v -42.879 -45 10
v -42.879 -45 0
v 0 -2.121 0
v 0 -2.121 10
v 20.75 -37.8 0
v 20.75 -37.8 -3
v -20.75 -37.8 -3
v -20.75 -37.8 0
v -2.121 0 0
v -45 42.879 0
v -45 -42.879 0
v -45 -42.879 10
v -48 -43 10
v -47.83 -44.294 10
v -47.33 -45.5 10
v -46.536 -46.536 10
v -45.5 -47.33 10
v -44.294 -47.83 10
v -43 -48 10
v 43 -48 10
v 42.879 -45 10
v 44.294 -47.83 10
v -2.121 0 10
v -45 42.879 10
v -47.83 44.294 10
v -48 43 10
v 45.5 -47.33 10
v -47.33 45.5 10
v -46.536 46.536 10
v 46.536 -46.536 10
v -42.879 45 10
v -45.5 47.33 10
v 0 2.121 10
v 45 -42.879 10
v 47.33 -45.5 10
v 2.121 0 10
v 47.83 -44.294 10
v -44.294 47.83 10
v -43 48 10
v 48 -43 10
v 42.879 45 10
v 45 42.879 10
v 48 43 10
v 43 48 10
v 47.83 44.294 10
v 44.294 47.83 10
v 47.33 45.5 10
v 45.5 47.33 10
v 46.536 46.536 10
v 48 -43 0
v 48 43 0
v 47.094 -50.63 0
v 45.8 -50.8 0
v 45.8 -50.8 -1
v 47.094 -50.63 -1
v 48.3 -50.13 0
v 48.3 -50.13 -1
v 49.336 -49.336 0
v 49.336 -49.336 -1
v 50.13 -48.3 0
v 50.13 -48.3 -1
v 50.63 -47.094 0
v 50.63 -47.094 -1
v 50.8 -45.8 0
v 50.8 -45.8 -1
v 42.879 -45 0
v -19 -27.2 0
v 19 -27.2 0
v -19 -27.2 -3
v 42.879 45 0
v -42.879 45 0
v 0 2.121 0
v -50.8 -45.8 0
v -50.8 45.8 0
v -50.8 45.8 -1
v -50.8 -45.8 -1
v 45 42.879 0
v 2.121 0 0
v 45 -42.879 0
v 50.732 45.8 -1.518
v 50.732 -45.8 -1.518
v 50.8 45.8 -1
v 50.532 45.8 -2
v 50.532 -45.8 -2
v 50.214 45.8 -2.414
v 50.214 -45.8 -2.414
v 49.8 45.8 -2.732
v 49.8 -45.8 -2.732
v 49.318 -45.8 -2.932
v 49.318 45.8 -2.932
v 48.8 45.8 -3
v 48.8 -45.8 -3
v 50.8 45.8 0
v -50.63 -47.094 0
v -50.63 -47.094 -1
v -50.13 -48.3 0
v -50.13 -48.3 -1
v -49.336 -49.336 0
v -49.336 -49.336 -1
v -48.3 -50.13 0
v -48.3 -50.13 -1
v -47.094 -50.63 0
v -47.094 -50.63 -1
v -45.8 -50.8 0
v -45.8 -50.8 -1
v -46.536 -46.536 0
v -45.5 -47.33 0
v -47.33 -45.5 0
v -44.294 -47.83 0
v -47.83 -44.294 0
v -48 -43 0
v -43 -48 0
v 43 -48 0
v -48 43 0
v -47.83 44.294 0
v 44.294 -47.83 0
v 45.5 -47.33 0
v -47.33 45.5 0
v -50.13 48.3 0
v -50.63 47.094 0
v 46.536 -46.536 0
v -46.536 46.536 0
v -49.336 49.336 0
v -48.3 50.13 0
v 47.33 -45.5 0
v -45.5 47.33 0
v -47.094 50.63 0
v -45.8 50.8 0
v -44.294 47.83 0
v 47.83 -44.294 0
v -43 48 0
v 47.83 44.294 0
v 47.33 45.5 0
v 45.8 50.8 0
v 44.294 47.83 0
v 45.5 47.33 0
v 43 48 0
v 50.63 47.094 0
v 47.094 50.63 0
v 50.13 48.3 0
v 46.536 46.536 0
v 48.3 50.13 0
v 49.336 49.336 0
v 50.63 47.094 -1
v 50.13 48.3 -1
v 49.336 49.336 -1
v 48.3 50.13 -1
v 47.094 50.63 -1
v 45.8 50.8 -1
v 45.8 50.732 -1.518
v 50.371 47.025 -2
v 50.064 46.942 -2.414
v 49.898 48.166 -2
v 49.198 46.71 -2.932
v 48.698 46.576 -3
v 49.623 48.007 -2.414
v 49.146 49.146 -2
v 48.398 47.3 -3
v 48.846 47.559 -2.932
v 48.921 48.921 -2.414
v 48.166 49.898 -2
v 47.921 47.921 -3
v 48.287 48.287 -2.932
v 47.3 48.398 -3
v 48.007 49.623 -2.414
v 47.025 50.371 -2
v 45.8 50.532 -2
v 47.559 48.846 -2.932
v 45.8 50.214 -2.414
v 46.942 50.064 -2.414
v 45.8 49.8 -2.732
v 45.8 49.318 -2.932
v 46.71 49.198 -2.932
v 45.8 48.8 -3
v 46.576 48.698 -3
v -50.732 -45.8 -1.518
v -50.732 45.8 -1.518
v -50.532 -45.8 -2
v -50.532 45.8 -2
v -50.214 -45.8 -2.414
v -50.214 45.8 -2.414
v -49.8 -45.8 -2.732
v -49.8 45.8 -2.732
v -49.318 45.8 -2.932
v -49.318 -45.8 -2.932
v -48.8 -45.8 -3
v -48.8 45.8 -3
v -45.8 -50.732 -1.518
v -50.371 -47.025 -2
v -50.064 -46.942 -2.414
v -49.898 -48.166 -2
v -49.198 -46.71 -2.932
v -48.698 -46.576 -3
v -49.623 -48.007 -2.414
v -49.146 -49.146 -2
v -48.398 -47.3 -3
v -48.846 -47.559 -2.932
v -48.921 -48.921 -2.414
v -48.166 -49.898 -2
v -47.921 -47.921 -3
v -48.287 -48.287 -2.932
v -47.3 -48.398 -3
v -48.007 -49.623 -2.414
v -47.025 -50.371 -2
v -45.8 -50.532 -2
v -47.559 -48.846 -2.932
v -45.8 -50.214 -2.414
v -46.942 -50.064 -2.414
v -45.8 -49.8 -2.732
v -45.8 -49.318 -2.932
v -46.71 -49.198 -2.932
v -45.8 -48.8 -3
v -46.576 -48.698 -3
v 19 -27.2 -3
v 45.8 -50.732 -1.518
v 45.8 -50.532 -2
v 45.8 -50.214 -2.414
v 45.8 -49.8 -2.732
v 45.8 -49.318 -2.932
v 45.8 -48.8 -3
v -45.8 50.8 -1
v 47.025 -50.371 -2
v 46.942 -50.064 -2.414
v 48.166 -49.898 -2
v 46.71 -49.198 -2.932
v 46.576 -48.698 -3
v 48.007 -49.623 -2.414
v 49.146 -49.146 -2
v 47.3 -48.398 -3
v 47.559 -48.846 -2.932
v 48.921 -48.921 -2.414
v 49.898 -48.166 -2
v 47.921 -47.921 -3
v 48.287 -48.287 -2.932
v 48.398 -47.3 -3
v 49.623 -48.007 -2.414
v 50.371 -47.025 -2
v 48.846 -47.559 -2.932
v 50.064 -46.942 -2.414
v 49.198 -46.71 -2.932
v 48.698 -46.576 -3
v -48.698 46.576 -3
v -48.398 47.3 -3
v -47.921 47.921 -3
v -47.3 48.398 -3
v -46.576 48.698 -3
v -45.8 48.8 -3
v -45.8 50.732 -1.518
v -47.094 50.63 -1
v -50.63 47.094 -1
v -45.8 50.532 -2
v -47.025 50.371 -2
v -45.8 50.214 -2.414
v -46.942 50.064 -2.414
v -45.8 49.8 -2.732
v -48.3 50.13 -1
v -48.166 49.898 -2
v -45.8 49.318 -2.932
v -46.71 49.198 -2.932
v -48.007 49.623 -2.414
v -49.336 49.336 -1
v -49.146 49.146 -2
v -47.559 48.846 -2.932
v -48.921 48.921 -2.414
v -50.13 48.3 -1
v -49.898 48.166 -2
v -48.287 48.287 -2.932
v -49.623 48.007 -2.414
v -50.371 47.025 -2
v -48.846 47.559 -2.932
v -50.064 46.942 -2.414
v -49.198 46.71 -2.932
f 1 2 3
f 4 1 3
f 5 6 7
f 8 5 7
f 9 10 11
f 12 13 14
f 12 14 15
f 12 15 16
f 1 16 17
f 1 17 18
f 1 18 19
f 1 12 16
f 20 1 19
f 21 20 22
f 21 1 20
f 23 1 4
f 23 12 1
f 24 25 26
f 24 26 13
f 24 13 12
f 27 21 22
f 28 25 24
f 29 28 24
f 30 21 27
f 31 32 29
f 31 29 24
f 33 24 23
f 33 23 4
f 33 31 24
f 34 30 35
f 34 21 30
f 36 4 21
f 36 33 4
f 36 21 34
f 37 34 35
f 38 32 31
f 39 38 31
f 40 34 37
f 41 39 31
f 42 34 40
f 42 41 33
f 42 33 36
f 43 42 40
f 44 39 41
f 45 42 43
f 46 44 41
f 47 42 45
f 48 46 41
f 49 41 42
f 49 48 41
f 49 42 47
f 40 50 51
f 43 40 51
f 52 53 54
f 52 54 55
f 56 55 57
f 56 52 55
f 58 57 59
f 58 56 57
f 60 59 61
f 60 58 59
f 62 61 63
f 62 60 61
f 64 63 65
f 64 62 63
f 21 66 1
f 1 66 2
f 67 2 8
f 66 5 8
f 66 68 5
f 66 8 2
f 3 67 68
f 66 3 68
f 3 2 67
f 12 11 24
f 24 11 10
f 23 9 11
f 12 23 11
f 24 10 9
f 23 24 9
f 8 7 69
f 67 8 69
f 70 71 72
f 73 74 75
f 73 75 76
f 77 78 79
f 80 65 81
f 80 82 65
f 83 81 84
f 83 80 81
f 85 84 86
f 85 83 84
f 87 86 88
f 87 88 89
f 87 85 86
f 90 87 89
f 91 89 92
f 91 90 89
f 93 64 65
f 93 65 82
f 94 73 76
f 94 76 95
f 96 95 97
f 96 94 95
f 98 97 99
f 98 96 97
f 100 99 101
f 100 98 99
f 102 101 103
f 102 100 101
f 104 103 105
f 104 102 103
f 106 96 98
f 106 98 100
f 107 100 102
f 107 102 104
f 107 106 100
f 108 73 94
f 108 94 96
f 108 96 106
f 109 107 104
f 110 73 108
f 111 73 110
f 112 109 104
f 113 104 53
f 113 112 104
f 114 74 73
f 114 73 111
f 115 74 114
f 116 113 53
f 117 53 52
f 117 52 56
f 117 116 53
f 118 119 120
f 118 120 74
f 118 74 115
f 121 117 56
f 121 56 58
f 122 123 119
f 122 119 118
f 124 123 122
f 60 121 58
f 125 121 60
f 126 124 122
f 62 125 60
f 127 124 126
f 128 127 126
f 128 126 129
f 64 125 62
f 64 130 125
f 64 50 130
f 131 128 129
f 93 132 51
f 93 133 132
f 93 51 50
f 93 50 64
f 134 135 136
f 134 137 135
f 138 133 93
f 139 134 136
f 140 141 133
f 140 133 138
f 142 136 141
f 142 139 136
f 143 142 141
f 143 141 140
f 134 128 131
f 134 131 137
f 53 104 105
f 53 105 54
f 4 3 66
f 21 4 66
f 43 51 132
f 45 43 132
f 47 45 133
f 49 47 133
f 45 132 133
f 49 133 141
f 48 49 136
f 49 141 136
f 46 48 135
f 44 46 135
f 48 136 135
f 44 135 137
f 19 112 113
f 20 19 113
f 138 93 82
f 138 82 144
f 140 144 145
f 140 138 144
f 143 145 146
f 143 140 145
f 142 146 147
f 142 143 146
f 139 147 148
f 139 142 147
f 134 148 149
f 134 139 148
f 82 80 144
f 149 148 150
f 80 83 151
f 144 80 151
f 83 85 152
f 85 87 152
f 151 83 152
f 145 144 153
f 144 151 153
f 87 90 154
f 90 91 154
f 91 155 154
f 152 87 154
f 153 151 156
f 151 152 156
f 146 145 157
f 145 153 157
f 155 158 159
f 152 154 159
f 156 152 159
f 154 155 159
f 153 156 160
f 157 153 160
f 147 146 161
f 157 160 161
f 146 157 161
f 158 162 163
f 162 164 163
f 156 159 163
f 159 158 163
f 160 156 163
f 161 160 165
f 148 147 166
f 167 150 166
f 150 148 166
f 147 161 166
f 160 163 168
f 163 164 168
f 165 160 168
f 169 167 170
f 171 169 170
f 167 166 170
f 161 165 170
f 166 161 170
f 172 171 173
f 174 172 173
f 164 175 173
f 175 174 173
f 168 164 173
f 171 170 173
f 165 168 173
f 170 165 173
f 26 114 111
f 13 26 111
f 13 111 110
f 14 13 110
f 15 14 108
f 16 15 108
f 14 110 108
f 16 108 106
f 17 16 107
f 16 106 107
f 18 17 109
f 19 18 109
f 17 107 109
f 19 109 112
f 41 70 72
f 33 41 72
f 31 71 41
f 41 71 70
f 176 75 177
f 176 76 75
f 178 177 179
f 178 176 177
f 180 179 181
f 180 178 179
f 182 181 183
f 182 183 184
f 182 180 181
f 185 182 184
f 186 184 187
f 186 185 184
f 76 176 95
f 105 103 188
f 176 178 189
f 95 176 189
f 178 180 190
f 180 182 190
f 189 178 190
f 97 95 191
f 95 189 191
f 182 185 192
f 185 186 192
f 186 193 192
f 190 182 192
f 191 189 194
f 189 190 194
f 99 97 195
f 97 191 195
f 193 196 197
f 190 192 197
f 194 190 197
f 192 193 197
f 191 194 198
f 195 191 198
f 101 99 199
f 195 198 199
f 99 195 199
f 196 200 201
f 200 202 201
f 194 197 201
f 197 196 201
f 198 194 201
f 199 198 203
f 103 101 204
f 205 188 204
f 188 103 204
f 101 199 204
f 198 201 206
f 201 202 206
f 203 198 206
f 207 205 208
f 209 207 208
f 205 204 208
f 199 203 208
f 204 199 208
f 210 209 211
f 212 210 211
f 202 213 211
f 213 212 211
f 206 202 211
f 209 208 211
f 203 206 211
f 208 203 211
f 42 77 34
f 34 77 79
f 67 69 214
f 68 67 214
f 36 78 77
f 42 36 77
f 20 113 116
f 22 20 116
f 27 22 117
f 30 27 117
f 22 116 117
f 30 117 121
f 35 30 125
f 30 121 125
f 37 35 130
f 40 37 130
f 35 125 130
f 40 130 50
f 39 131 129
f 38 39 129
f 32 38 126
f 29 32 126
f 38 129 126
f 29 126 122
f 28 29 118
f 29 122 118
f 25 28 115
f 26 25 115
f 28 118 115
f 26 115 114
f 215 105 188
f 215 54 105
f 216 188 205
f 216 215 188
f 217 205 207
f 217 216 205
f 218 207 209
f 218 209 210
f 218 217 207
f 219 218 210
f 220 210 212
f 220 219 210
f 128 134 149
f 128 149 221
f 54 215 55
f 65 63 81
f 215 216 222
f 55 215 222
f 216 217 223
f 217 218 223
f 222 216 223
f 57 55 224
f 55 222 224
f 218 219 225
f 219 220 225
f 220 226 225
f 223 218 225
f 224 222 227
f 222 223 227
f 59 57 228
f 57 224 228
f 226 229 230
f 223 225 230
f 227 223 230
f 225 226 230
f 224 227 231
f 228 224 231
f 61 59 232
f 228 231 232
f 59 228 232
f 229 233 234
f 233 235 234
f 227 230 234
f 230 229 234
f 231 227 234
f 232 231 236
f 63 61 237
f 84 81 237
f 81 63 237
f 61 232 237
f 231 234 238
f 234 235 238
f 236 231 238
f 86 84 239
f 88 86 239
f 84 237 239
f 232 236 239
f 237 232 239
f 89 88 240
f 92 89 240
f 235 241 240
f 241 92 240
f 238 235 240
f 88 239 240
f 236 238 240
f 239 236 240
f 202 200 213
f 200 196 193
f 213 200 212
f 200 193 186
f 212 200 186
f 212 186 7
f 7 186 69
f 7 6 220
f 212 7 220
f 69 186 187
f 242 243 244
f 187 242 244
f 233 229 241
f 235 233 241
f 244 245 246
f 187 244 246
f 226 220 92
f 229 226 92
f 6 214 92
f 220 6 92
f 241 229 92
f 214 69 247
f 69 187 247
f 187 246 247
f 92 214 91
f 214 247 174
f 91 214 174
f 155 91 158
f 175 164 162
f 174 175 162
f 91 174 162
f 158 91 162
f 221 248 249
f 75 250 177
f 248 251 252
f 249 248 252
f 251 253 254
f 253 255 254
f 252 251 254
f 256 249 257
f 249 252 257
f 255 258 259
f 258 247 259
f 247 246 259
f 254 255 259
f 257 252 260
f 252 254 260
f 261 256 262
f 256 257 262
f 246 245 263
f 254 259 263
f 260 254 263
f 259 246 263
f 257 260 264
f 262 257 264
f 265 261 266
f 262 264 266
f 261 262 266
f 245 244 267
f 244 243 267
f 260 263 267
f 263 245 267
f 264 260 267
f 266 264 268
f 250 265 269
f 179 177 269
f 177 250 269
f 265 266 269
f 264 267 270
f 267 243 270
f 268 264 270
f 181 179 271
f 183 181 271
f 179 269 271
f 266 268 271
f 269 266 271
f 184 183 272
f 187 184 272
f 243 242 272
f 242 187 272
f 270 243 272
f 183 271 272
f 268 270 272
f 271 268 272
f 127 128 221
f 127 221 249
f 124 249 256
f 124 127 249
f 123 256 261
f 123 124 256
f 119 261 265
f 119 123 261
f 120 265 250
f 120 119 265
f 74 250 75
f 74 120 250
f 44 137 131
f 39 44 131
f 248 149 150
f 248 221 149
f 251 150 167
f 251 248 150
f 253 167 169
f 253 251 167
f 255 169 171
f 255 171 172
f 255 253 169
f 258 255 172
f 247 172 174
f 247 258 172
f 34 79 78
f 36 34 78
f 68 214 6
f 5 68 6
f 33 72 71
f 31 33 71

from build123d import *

# Parameters (mm, degrees)
F2_DEPTH = 3
F3_DEPTH = 10
F4_R     = 2
F6_DEPTH = 4.4


with BuildPart() as f2:
    # F1 (on Top) → F2 (new body)
    with BuildSketch(Plane.XY):
        with BuildLine():
            Line((45.8, 50.8), (-45.8, 50.8))
            ThreePointArc((-45.8, 50.8), (-49.3355339059, 49.3355339059), (-50.8, 45.8))
            Line((-50.8, 45.8), (-50.8, -45.8))
            ThreePointArc((-50.8, -45.8), (-49.3355339059, -49.3355339059), (-45.8, -50.8))
            Line((-45.8, -50.8), (45.8, -50.8))
            ThreePointArc((45.8, -50.8), (49.3355339059, -49.3355339059), (50.8, -45.8))
            Line((50.8, -45.8), (50.8, 45.8))
            ThreePointArc((50.8, 45.8), (49.3355339059, 49.3355339059), (45.8, 50.8))
        make_face()
        with BuildLine():
            ThreePointArc((-48, 43), (-46.5355339059, 46.5355339059), (-43, 48))
            Line((-43, 48), (43, 48))
            ThreePointArc((43, 48), (46.5355339059, 46.5355339059), (48, 43))
            Line((48, 43), (48, -43))
            ThreePointArc((48, -43), (46.5355339059, -46.5355339059), (43, -48))
            Line((43, -48), (-43, -48))
            ThreePointArc((-43, -48), (-46.5355339059, -46.5355339059), (-48, -43))
            Line((-48, -43), (-48, 43))
        make_face(mode=Mode.SUBTRACT)
        with BuildLine():
            Line((43, 48), (-43, 48))
            ThreePointArc((-43, 48), (-46.5355339059, 46.5355339059), (-48, 43))
            Line((-48, 43), (-48, -43))
            ThreePointArc((-48, -43), (-46.5355339059, -46.5355339059), (-43, -48))
            Line((-43, -48), (43, -48))
            ThreePointArc((43, -48), (46.5355339059, -46.5355339059), (48, -43))
            Line((48, -43), (48, 43))
            ThreePointArc((48, 43), (46.5355339059, 46.5355339059), (43, 48))
        make_face()
        Polygon((45, -42.8786796564), (45, -45), (42.8786796564, -45), (-42.8786796564, -45), (-45, -45), (-45, -42.8786796564), (-45, 42.8786796564), (-45, 45), (-42.8786796564, 45), (42.8786796564, 45), (45, 45), (45, 42.8786796564), align=None, mode=Mode.SUBTRACT)
        Polygon((-45, 42.8786796564), (-45, -42.8786796564), (-2.1213203436, 0), align=None)
        Polygon((0, 2.1213203436), (42.8786796564, 45), (-42.8786796564, 45), align=None)
        Polygon((2.1213203436, 0), (45, -42.8786796564), (45, 42.8786796564), align=None)
        Polygon((-42.8786796564, -45), (42.8786796564, -45), (0, -2.1213203436), align=None)
        Polygon((42.8786796564, -45), (45, -45), (45, -42.8786796564), (2.1213203436, 0), (45, 42.8786796564), (45, 45), (42.8786796564, 45), (0, 2.1213203436), (-42.8786796564, 45), (-45, 45), (-45, 42.8786796564), (-2.1213203436, 0), (-45, -42.8786796564), (-45, -45), (-42.8786796564, -45), (0, -2.1213203436), align=None)
    extrude(amount=-F2_DEPTH)

    # F1 (on Top) → F3 (join)
    with BuildSketch(Plane.XY):
        with BuildLine():
            Line((43, 48), (-43, 48))
            ThreePointArc((-43, 48), (-46.5355339059, 46.5355339059), (-48, 43))
            Line((-48, 43), (-48, -43))
            ThreePointArc((-48, -43), (-46.5355339059, -46.5355339059), (-43, -48))
            Line((-43, -48), (43, -48))
            ThreePointArc((43, -48), (46.5355339059, -46.5355339059), (48, -43))
            Line((48, -43), (48, 43))
            ThreePointArc((48, 43), (46.5355339059, 46.5355339059), (43, 48))
        make_face()
        Polygon((45, -42.8786796564), (45, -45), (42.8786796564, -45), (-42.8786796564, -45), (-45, -45), (-45, -42.8786796564), (-45, 42.8786796564), (-45, 45), (-42.8786796564, 45), (42.8786796564, 45), (45, 45), (45, 42.8786796564), align=None, mode=Mode.SUBTRACT)
        Polygon((42.8786796564, -45), (45, -45), (45, -42.8786796564), (2.1213203436, 0), (45, 42.8786796564), (45, 45), (42.8786796564, 45), (0, 2.1213203436), (-42.8786796564, 45), (-45, 45), (-45, 42.8786796564), (-2.1213203436, 0), (-45, -42.8786796564), (-45, -45), (-42.8786796564, -45), (0, -2.1213203436), align=None)
    extrude(amount=F3_DEPTH)

    # F4
    f4_edges = [f2.edges().sort_by_distance(p)[0] for p in [
        (0, 50.8, -3),
        (-49.335534, 49.335534, -3),
        (-50.8, 0, -3),
        (-49.335534, -49.335534, -3),
        (0, -50.8, -3),
        (49.335534, -49.335534, -3),
        (50.8, 0, -3),
        (49.335534, 49.335534, -3),
    ]]
    fillet(f4_edges, radius=F4_R)

    # F5 (on face) → F6 (cut)
    with BuildSketch(Plane(origin=(0, 0, -3), x_dir=(1, 0, 0), z_dir=(0, 0, -1))):
        Polygon((20.75, 37.8), (-20.75, 37.8), (-19, 27.2), (19, 27.2), align=None)
    extrude(amount=-F6_DEPTH, mode=Mode.SUBTRACT)


solid = f2.part
